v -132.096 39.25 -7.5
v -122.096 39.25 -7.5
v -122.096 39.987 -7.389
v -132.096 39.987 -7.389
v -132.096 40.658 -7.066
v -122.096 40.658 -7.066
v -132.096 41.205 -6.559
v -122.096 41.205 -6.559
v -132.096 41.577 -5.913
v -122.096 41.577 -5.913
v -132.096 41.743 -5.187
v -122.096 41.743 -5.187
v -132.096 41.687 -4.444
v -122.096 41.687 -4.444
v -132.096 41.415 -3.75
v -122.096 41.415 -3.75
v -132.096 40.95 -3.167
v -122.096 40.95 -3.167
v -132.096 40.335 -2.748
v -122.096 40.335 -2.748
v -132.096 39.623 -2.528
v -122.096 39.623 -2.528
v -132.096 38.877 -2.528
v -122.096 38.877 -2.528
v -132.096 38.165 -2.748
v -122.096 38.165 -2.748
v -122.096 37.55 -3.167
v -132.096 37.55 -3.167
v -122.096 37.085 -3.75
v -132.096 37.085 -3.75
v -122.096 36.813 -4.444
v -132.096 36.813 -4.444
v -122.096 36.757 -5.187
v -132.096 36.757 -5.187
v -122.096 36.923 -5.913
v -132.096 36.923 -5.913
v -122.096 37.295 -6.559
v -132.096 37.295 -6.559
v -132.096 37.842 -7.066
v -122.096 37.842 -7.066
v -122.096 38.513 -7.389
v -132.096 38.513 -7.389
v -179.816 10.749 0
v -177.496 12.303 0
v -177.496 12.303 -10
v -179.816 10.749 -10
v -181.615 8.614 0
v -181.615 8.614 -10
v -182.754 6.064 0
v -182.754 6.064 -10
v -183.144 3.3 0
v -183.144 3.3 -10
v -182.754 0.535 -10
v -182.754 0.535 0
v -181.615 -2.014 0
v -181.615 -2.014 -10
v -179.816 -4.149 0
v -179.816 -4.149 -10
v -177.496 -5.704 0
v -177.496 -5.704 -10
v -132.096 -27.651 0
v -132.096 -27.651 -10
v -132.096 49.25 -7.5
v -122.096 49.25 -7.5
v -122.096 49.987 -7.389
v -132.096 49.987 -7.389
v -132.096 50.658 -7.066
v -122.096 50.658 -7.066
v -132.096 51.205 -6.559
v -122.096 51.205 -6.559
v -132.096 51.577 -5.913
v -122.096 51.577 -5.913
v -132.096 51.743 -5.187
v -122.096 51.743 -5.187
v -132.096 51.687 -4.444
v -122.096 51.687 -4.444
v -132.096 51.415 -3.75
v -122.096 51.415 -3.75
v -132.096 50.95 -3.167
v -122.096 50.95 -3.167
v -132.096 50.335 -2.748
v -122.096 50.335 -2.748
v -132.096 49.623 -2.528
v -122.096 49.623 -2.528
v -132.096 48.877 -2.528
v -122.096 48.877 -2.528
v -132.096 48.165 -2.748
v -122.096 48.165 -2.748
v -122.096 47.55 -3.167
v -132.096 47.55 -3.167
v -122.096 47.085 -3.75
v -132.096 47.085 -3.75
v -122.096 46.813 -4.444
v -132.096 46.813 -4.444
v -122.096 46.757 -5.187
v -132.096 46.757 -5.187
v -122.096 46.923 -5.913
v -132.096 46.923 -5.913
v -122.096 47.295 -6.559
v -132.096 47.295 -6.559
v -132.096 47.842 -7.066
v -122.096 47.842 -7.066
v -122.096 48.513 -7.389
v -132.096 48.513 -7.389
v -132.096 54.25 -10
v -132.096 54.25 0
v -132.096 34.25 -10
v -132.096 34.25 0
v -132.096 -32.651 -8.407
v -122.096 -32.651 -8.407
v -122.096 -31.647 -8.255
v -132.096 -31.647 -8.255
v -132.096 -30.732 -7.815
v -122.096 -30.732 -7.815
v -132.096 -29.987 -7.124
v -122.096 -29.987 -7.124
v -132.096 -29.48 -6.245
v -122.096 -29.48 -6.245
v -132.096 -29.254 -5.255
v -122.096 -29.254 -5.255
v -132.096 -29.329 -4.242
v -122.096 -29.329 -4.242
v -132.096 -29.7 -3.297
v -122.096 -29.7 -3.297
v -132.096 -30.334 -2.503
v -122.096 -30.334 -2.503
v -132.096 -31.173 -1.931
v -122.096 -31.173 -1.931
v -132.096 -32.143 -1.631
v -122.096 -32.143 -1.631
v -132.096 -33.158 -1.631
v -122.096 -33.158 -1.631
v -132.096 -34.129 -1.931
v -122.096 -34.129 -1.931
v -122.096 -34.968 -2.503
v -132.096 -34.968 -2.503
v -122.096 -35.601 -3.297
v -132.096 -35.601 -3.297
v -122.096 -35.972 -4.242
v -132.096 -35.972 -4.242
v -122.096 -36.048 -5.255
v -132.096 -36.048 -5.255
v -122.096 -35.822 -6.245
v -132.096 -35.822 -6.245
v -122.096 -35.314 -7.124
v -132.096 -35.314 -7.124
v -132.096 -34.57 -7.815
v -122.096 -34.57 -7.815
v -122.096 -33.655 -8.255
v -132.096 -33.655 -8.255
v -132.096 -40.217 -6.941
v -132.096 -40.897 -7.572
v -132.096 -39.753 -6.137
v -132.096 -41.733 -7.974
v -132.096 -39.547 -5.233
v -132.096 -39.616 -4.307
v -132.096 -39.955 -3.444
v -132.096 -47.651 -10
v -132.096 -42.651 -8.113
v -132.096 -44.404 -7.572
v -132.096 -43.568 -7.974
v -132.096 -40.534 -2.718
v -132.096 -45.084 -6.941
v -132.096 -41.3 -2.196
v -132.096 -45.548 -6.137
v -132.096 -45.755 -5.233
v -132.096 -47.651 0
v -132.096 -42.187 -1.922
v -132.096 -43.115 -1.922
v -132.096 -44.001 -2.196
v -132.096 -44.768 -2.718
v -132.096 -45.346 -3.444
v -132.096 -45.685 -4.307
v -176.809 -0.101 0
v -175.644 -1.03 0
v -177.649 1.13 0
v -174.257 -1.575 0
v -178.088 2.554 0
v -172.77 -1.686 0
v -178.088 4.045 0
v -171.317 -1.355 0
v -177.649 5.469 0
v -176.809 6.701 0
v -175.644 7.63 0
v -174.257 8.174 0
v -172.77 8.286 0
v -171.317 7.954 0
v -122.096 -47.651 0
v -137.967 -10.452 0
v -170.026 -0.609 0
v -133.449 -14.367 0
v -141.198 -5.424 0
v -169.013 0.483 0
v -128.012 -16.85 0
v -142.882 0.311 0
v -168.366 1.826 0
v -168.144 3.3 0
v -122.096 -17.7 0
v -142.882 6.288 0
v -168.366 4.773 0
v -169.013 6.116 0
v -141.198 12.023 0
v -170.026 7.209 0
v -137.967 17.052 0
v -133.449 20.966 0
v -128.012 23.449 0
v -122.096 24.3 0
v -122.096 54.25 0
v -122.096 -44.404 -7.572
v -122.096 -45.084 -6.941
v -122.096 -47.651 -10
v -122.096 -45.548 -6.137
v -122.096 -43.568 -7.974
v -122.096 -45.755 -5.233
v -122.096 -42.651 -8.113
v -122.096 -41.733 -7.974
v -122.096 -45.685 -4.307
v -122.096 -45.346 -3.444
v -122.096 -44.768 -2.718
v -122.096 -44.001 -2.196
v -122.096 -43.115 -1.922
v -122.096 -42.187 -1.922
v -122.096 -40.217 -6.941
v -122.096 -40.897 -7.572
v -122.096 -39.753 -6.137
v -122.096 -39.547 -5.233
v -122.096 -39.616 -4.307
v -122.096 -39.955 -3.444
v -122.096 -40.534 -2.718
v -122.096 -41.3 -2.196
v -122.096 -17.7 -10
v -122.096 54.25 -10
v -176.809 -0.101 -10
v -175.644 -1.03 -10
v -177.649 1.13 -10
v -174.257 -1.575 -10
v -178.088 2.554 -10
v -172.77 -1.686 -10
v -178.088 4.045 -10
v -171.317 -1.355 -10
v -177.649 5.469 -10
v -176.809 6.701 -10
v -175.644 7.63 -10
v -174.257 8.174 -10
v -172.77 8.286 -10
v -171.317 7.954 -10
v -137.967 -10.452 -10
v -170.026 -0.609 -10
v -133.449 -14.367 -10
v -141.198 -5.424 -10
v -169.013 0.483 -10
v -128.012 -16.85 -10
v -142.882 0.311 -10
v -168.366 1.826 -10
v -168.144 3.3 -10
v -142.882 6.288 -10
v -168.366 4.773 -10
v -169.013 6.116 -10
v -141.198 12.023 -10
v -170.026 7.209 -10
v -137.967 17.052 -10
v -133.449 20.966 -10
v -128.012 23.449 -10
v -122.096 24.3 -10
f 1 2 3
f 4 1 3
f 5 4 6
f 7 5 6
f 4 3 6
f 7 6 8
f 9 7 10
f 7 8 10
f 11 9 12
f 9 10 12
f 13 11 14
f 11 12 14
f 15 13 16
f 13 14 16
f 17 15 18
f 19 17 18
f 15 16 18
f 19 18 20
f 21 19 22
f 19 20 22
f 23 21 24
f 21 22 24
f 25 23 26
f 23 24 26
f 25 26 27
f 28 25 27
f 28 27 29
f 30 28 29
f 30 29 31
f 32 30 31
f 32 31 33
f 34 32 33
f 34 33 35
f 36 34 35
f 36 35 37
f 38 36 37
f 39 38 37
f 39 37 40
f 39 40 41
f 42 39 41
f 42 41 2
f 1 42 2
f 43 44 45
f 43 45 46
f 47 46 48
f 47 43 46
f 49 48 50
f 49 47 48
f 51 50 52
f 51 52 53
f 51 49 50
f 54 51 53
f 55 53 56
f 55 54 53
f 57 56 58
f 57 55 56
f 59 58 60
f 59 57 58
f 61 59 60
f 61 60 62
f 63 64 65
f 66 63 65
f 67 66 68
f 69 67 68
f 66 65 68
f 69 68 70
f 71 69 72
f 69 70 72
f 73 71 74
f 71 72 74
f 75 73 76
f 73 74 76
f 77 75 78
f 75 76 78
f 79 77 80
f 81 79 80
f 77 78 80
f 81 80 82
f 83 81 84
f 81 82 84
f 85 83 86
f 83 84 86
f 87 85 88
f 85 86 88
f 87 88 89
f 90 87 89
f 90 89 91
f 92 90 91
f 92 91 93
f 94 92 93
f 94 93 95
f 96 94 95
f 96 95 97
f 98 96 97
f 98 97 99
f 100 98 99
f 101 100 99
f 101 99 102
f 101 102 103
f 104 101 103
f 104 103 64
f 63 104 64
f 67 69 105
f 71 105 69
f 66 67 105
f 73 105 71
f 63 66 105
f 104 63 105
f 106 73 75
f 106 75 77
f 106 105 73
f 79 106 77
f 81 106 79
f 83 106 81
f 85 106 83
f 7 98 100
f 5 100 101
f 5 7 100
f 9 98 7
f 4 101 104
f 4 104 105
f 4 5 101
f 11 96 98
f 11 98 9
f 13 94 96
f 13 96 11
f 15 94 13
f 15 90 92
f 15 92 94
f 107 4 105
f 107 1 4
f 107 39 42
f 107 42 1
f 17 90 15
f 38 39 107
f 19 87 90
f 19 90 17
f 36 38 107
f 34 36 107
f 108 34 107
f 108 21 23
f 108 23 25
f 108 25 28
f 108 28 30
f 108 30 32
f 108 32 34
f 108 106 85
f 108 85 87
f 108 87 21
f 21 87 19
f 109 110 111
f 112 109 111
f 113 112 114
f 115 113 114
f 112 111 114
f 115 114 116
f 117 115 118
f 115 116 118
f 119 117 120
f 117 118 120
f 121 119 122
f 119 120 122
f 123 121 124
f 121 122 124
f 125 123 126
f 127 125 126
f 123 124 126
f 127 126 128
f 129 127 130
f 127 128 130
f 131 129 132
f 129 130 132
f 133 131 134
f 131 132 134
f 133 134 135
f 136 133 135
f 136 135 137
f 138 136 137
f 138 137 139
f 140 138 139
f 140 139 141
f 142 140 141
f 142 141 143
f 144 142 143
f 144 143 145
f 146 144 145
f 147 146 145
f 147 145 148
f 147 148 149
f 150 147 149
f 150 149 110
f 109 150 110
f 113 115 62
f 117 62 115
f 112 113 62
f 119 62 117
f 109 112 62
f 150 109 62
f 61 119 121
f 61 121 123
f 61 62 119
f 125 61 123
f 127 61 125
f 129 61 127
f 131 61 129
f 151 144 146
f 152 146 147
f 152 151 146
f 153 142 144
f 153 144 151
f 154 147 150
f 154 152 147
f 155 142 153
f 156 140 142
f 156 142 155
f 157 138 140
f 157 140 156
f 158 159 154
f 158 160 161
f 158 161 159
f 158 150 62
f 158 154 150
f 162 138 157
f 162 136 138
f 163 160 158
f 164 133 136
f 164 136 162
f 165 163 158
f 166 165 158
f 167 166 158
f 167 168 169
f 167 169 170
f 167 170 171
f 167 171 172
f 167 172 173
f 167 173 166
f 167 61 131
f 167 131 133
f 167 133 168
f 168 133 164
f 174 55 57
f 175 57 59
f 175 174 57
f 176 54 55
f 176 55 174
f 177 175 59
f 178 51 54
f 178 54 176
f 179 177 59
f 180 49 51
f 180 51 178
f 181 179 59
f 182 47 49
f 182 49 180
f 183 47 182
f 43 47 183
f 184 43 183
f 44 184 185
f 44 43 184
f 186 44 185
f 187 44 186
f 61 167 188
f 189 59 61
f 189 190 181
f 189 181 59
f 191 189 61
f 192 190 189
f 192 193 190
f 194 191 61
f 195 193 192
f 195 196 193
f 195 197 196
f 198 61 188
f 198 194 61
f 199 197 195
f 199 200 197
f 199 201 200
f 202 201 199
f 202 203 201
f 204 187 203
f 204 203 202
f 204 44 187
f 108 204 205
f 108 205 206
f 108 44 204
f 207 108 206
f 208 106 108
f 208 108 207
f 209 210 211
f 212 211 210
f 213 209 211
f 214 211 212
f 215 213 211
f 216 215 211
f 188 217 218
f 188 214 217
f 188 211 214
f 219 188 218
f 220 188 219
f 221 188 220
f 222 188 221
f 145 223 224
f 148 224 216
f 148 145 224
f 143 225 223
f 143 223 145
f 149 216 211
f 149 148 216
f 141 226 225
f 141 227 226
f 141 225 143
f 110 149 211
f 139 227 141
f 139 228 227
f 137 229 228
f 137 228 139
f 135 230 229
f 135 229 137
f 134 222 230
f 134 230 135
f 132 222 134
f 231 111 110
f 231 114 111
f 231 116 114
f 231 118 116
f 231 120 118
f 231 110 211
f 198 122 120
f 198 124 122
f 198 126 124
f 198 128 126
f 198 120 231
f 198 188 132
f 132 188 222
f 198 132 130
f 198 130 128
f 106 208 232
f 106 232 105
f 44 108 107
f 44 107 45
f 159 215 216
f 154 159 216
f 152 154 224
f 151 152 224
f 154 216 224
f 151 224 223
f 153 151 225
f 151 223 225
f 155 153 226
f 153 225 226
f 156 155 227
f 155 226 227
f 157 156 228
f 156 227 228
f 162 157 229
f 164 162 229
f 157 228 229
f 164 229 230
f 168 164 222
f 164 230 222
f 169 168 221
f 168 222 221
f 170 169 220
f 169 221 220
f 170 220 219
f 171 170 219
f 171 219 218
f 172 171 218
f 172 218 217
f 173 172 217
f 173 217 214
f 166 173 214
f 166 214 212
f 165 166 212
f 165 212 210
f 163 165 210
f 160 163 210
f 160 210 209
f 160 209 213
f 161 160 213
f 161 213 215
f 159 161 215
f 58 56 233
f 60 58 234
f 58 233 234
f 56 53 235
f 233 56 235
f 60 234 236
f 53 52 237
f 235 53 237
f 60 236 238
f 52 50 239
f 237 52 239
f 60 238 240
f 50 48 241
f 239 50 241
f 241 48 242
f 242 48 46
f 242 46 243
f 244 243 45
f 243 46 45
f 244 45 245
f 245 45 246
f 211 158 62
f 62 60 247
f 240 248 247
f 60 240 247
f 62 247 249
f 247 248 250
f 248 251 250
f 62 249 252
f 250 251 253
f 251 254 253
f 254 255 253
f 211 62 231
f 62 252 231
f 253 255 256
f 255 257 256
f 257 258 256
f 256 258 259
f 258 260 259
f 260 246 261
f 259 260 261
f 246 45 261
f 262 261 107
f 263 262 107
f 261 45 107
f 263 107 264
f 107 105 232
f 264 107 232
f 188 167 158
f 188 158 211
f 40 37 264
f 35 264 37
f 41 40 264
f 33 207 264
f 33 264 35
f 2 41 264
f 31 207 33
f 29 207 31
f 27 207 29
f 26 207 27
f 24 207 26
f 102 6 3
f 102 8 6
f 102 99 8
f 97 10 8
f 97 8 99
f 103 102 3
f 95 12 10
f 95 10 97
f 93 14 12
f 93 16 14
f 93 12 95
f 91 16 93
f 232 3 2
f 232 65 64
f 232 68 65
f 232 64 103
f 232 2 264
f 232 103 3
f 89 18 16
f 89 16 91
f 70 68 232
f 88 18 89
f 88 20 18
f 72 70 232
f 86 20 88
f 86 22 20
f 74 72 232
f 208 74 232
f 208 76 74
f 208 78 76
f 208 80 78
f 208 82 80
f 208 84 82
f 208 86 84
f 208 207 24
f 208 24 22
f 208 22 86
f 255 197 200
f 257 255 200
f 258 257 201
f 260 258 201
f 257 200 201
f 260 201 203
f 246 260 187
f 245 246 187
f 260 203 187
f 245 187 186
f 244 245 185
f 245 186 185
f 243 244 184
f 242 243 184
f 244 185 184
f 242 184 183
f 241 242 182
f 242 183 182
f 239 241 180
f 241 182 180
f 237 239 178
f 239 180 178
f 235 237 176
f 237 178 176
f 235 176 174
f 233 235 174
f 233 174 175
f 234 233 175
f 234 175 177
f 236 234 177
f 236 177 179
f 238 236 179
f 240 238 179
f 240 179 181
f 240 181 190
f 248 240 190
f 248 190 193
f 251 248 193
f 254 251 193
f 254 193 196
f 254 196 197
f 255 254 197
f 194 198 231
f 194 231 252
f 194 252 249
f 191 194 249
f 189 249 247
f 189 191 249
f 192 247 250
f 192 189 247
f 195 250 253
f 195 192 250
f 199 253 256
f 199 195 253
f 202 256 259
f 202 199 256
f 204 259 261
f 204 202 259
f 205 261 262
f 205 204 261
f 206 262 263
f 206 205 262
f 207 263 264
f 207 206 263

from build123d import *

# Parameters (mm, degrees)
BOSS_EXTRUDE2_DEPTH = 10
SKETCH2_R           = 5
CUT_EXTRUDE1_DEPTH  = 192.271419748
SKETCH3_R           = 2.5
SKETCH3_R_2         = 3.112586519
SKETCH3_R_3         = 3.406605284
CUT_EXTRUDE2_DEPTH  = 83.27950738


with BuildPart() as part:
    # Sketch1 → Boss-Extrude2 (new body)
    with BuildSketch(Plane.XY):
        with BuildLine():
            Line((-122.095943171, 24.299679487), (-122.095943171, 54.25))
            Line((-122.095943171, 54.25), (-132.095943171, 54.25))
            Line((-132.095943171, 54.25), (-132.095943171, 34.25))
            Line((-132.095943171, 34.25), (-177.496190175, 12.302884399))
            ThreePointArc((-177.496190175, 12.302884399), (-183.143914757, 3.299679487), (-177.496190175, -5.703525425))
            Line((-177.496190175, -5.703525425), (-132.095943171, -27.650641026))
            Line((-132.095943171, -27.650641026), (-132.095943171, -47.650641026))
            Line((-132.095943171, -47.650641026), (-122.095943171, -47.650641026))
            Line((-122.095943171, -47.650641026), (-122.095943171, -17.700320513))
            ThreePointArc((-122.095943171, -17.700320513), (-143.095943171, 3.299679487), (-122.095943171, 24.299679487))
        make_face()
    extrude(amount=-BOSS_EXTRUDE2_DEPTH)

    # Sketch2 → Cut-Extrude1 (cut, through all)
    with BuildSketch(Plane.XY):
        with Locations((-173.143914757, 3.299679487)):
            Circle(SKETCH2_R)
    extrude(amount=-CUT_EXTRUDE1_DEPTH, mode=Mode.SUBTRACT)

    # Sketch3 → Cut-Extrude2 (cut, through all)
    with BuildSketch(Plane(origin=(-122.095943171, 0, 0), x_dir=(0, 0, -1), z_dir=(1, 0, 0))):
        with Locations((5, 49.25)):
            Circle(SKETCH3_R)
        with Locations((5, 39.25)):
            Circle(SKETCH3_R)
        with Locations((5, -42.650641026)):
            Circle(SKETCH3_R_2)
        with Locations((5, -32.650641026)):
            Circle(SKETCH3_R_3)
    extrude(amount=-CUT_EXTRUDE2_DEPTH, mode=Mode.SUBTRACT)


solid = part.part
